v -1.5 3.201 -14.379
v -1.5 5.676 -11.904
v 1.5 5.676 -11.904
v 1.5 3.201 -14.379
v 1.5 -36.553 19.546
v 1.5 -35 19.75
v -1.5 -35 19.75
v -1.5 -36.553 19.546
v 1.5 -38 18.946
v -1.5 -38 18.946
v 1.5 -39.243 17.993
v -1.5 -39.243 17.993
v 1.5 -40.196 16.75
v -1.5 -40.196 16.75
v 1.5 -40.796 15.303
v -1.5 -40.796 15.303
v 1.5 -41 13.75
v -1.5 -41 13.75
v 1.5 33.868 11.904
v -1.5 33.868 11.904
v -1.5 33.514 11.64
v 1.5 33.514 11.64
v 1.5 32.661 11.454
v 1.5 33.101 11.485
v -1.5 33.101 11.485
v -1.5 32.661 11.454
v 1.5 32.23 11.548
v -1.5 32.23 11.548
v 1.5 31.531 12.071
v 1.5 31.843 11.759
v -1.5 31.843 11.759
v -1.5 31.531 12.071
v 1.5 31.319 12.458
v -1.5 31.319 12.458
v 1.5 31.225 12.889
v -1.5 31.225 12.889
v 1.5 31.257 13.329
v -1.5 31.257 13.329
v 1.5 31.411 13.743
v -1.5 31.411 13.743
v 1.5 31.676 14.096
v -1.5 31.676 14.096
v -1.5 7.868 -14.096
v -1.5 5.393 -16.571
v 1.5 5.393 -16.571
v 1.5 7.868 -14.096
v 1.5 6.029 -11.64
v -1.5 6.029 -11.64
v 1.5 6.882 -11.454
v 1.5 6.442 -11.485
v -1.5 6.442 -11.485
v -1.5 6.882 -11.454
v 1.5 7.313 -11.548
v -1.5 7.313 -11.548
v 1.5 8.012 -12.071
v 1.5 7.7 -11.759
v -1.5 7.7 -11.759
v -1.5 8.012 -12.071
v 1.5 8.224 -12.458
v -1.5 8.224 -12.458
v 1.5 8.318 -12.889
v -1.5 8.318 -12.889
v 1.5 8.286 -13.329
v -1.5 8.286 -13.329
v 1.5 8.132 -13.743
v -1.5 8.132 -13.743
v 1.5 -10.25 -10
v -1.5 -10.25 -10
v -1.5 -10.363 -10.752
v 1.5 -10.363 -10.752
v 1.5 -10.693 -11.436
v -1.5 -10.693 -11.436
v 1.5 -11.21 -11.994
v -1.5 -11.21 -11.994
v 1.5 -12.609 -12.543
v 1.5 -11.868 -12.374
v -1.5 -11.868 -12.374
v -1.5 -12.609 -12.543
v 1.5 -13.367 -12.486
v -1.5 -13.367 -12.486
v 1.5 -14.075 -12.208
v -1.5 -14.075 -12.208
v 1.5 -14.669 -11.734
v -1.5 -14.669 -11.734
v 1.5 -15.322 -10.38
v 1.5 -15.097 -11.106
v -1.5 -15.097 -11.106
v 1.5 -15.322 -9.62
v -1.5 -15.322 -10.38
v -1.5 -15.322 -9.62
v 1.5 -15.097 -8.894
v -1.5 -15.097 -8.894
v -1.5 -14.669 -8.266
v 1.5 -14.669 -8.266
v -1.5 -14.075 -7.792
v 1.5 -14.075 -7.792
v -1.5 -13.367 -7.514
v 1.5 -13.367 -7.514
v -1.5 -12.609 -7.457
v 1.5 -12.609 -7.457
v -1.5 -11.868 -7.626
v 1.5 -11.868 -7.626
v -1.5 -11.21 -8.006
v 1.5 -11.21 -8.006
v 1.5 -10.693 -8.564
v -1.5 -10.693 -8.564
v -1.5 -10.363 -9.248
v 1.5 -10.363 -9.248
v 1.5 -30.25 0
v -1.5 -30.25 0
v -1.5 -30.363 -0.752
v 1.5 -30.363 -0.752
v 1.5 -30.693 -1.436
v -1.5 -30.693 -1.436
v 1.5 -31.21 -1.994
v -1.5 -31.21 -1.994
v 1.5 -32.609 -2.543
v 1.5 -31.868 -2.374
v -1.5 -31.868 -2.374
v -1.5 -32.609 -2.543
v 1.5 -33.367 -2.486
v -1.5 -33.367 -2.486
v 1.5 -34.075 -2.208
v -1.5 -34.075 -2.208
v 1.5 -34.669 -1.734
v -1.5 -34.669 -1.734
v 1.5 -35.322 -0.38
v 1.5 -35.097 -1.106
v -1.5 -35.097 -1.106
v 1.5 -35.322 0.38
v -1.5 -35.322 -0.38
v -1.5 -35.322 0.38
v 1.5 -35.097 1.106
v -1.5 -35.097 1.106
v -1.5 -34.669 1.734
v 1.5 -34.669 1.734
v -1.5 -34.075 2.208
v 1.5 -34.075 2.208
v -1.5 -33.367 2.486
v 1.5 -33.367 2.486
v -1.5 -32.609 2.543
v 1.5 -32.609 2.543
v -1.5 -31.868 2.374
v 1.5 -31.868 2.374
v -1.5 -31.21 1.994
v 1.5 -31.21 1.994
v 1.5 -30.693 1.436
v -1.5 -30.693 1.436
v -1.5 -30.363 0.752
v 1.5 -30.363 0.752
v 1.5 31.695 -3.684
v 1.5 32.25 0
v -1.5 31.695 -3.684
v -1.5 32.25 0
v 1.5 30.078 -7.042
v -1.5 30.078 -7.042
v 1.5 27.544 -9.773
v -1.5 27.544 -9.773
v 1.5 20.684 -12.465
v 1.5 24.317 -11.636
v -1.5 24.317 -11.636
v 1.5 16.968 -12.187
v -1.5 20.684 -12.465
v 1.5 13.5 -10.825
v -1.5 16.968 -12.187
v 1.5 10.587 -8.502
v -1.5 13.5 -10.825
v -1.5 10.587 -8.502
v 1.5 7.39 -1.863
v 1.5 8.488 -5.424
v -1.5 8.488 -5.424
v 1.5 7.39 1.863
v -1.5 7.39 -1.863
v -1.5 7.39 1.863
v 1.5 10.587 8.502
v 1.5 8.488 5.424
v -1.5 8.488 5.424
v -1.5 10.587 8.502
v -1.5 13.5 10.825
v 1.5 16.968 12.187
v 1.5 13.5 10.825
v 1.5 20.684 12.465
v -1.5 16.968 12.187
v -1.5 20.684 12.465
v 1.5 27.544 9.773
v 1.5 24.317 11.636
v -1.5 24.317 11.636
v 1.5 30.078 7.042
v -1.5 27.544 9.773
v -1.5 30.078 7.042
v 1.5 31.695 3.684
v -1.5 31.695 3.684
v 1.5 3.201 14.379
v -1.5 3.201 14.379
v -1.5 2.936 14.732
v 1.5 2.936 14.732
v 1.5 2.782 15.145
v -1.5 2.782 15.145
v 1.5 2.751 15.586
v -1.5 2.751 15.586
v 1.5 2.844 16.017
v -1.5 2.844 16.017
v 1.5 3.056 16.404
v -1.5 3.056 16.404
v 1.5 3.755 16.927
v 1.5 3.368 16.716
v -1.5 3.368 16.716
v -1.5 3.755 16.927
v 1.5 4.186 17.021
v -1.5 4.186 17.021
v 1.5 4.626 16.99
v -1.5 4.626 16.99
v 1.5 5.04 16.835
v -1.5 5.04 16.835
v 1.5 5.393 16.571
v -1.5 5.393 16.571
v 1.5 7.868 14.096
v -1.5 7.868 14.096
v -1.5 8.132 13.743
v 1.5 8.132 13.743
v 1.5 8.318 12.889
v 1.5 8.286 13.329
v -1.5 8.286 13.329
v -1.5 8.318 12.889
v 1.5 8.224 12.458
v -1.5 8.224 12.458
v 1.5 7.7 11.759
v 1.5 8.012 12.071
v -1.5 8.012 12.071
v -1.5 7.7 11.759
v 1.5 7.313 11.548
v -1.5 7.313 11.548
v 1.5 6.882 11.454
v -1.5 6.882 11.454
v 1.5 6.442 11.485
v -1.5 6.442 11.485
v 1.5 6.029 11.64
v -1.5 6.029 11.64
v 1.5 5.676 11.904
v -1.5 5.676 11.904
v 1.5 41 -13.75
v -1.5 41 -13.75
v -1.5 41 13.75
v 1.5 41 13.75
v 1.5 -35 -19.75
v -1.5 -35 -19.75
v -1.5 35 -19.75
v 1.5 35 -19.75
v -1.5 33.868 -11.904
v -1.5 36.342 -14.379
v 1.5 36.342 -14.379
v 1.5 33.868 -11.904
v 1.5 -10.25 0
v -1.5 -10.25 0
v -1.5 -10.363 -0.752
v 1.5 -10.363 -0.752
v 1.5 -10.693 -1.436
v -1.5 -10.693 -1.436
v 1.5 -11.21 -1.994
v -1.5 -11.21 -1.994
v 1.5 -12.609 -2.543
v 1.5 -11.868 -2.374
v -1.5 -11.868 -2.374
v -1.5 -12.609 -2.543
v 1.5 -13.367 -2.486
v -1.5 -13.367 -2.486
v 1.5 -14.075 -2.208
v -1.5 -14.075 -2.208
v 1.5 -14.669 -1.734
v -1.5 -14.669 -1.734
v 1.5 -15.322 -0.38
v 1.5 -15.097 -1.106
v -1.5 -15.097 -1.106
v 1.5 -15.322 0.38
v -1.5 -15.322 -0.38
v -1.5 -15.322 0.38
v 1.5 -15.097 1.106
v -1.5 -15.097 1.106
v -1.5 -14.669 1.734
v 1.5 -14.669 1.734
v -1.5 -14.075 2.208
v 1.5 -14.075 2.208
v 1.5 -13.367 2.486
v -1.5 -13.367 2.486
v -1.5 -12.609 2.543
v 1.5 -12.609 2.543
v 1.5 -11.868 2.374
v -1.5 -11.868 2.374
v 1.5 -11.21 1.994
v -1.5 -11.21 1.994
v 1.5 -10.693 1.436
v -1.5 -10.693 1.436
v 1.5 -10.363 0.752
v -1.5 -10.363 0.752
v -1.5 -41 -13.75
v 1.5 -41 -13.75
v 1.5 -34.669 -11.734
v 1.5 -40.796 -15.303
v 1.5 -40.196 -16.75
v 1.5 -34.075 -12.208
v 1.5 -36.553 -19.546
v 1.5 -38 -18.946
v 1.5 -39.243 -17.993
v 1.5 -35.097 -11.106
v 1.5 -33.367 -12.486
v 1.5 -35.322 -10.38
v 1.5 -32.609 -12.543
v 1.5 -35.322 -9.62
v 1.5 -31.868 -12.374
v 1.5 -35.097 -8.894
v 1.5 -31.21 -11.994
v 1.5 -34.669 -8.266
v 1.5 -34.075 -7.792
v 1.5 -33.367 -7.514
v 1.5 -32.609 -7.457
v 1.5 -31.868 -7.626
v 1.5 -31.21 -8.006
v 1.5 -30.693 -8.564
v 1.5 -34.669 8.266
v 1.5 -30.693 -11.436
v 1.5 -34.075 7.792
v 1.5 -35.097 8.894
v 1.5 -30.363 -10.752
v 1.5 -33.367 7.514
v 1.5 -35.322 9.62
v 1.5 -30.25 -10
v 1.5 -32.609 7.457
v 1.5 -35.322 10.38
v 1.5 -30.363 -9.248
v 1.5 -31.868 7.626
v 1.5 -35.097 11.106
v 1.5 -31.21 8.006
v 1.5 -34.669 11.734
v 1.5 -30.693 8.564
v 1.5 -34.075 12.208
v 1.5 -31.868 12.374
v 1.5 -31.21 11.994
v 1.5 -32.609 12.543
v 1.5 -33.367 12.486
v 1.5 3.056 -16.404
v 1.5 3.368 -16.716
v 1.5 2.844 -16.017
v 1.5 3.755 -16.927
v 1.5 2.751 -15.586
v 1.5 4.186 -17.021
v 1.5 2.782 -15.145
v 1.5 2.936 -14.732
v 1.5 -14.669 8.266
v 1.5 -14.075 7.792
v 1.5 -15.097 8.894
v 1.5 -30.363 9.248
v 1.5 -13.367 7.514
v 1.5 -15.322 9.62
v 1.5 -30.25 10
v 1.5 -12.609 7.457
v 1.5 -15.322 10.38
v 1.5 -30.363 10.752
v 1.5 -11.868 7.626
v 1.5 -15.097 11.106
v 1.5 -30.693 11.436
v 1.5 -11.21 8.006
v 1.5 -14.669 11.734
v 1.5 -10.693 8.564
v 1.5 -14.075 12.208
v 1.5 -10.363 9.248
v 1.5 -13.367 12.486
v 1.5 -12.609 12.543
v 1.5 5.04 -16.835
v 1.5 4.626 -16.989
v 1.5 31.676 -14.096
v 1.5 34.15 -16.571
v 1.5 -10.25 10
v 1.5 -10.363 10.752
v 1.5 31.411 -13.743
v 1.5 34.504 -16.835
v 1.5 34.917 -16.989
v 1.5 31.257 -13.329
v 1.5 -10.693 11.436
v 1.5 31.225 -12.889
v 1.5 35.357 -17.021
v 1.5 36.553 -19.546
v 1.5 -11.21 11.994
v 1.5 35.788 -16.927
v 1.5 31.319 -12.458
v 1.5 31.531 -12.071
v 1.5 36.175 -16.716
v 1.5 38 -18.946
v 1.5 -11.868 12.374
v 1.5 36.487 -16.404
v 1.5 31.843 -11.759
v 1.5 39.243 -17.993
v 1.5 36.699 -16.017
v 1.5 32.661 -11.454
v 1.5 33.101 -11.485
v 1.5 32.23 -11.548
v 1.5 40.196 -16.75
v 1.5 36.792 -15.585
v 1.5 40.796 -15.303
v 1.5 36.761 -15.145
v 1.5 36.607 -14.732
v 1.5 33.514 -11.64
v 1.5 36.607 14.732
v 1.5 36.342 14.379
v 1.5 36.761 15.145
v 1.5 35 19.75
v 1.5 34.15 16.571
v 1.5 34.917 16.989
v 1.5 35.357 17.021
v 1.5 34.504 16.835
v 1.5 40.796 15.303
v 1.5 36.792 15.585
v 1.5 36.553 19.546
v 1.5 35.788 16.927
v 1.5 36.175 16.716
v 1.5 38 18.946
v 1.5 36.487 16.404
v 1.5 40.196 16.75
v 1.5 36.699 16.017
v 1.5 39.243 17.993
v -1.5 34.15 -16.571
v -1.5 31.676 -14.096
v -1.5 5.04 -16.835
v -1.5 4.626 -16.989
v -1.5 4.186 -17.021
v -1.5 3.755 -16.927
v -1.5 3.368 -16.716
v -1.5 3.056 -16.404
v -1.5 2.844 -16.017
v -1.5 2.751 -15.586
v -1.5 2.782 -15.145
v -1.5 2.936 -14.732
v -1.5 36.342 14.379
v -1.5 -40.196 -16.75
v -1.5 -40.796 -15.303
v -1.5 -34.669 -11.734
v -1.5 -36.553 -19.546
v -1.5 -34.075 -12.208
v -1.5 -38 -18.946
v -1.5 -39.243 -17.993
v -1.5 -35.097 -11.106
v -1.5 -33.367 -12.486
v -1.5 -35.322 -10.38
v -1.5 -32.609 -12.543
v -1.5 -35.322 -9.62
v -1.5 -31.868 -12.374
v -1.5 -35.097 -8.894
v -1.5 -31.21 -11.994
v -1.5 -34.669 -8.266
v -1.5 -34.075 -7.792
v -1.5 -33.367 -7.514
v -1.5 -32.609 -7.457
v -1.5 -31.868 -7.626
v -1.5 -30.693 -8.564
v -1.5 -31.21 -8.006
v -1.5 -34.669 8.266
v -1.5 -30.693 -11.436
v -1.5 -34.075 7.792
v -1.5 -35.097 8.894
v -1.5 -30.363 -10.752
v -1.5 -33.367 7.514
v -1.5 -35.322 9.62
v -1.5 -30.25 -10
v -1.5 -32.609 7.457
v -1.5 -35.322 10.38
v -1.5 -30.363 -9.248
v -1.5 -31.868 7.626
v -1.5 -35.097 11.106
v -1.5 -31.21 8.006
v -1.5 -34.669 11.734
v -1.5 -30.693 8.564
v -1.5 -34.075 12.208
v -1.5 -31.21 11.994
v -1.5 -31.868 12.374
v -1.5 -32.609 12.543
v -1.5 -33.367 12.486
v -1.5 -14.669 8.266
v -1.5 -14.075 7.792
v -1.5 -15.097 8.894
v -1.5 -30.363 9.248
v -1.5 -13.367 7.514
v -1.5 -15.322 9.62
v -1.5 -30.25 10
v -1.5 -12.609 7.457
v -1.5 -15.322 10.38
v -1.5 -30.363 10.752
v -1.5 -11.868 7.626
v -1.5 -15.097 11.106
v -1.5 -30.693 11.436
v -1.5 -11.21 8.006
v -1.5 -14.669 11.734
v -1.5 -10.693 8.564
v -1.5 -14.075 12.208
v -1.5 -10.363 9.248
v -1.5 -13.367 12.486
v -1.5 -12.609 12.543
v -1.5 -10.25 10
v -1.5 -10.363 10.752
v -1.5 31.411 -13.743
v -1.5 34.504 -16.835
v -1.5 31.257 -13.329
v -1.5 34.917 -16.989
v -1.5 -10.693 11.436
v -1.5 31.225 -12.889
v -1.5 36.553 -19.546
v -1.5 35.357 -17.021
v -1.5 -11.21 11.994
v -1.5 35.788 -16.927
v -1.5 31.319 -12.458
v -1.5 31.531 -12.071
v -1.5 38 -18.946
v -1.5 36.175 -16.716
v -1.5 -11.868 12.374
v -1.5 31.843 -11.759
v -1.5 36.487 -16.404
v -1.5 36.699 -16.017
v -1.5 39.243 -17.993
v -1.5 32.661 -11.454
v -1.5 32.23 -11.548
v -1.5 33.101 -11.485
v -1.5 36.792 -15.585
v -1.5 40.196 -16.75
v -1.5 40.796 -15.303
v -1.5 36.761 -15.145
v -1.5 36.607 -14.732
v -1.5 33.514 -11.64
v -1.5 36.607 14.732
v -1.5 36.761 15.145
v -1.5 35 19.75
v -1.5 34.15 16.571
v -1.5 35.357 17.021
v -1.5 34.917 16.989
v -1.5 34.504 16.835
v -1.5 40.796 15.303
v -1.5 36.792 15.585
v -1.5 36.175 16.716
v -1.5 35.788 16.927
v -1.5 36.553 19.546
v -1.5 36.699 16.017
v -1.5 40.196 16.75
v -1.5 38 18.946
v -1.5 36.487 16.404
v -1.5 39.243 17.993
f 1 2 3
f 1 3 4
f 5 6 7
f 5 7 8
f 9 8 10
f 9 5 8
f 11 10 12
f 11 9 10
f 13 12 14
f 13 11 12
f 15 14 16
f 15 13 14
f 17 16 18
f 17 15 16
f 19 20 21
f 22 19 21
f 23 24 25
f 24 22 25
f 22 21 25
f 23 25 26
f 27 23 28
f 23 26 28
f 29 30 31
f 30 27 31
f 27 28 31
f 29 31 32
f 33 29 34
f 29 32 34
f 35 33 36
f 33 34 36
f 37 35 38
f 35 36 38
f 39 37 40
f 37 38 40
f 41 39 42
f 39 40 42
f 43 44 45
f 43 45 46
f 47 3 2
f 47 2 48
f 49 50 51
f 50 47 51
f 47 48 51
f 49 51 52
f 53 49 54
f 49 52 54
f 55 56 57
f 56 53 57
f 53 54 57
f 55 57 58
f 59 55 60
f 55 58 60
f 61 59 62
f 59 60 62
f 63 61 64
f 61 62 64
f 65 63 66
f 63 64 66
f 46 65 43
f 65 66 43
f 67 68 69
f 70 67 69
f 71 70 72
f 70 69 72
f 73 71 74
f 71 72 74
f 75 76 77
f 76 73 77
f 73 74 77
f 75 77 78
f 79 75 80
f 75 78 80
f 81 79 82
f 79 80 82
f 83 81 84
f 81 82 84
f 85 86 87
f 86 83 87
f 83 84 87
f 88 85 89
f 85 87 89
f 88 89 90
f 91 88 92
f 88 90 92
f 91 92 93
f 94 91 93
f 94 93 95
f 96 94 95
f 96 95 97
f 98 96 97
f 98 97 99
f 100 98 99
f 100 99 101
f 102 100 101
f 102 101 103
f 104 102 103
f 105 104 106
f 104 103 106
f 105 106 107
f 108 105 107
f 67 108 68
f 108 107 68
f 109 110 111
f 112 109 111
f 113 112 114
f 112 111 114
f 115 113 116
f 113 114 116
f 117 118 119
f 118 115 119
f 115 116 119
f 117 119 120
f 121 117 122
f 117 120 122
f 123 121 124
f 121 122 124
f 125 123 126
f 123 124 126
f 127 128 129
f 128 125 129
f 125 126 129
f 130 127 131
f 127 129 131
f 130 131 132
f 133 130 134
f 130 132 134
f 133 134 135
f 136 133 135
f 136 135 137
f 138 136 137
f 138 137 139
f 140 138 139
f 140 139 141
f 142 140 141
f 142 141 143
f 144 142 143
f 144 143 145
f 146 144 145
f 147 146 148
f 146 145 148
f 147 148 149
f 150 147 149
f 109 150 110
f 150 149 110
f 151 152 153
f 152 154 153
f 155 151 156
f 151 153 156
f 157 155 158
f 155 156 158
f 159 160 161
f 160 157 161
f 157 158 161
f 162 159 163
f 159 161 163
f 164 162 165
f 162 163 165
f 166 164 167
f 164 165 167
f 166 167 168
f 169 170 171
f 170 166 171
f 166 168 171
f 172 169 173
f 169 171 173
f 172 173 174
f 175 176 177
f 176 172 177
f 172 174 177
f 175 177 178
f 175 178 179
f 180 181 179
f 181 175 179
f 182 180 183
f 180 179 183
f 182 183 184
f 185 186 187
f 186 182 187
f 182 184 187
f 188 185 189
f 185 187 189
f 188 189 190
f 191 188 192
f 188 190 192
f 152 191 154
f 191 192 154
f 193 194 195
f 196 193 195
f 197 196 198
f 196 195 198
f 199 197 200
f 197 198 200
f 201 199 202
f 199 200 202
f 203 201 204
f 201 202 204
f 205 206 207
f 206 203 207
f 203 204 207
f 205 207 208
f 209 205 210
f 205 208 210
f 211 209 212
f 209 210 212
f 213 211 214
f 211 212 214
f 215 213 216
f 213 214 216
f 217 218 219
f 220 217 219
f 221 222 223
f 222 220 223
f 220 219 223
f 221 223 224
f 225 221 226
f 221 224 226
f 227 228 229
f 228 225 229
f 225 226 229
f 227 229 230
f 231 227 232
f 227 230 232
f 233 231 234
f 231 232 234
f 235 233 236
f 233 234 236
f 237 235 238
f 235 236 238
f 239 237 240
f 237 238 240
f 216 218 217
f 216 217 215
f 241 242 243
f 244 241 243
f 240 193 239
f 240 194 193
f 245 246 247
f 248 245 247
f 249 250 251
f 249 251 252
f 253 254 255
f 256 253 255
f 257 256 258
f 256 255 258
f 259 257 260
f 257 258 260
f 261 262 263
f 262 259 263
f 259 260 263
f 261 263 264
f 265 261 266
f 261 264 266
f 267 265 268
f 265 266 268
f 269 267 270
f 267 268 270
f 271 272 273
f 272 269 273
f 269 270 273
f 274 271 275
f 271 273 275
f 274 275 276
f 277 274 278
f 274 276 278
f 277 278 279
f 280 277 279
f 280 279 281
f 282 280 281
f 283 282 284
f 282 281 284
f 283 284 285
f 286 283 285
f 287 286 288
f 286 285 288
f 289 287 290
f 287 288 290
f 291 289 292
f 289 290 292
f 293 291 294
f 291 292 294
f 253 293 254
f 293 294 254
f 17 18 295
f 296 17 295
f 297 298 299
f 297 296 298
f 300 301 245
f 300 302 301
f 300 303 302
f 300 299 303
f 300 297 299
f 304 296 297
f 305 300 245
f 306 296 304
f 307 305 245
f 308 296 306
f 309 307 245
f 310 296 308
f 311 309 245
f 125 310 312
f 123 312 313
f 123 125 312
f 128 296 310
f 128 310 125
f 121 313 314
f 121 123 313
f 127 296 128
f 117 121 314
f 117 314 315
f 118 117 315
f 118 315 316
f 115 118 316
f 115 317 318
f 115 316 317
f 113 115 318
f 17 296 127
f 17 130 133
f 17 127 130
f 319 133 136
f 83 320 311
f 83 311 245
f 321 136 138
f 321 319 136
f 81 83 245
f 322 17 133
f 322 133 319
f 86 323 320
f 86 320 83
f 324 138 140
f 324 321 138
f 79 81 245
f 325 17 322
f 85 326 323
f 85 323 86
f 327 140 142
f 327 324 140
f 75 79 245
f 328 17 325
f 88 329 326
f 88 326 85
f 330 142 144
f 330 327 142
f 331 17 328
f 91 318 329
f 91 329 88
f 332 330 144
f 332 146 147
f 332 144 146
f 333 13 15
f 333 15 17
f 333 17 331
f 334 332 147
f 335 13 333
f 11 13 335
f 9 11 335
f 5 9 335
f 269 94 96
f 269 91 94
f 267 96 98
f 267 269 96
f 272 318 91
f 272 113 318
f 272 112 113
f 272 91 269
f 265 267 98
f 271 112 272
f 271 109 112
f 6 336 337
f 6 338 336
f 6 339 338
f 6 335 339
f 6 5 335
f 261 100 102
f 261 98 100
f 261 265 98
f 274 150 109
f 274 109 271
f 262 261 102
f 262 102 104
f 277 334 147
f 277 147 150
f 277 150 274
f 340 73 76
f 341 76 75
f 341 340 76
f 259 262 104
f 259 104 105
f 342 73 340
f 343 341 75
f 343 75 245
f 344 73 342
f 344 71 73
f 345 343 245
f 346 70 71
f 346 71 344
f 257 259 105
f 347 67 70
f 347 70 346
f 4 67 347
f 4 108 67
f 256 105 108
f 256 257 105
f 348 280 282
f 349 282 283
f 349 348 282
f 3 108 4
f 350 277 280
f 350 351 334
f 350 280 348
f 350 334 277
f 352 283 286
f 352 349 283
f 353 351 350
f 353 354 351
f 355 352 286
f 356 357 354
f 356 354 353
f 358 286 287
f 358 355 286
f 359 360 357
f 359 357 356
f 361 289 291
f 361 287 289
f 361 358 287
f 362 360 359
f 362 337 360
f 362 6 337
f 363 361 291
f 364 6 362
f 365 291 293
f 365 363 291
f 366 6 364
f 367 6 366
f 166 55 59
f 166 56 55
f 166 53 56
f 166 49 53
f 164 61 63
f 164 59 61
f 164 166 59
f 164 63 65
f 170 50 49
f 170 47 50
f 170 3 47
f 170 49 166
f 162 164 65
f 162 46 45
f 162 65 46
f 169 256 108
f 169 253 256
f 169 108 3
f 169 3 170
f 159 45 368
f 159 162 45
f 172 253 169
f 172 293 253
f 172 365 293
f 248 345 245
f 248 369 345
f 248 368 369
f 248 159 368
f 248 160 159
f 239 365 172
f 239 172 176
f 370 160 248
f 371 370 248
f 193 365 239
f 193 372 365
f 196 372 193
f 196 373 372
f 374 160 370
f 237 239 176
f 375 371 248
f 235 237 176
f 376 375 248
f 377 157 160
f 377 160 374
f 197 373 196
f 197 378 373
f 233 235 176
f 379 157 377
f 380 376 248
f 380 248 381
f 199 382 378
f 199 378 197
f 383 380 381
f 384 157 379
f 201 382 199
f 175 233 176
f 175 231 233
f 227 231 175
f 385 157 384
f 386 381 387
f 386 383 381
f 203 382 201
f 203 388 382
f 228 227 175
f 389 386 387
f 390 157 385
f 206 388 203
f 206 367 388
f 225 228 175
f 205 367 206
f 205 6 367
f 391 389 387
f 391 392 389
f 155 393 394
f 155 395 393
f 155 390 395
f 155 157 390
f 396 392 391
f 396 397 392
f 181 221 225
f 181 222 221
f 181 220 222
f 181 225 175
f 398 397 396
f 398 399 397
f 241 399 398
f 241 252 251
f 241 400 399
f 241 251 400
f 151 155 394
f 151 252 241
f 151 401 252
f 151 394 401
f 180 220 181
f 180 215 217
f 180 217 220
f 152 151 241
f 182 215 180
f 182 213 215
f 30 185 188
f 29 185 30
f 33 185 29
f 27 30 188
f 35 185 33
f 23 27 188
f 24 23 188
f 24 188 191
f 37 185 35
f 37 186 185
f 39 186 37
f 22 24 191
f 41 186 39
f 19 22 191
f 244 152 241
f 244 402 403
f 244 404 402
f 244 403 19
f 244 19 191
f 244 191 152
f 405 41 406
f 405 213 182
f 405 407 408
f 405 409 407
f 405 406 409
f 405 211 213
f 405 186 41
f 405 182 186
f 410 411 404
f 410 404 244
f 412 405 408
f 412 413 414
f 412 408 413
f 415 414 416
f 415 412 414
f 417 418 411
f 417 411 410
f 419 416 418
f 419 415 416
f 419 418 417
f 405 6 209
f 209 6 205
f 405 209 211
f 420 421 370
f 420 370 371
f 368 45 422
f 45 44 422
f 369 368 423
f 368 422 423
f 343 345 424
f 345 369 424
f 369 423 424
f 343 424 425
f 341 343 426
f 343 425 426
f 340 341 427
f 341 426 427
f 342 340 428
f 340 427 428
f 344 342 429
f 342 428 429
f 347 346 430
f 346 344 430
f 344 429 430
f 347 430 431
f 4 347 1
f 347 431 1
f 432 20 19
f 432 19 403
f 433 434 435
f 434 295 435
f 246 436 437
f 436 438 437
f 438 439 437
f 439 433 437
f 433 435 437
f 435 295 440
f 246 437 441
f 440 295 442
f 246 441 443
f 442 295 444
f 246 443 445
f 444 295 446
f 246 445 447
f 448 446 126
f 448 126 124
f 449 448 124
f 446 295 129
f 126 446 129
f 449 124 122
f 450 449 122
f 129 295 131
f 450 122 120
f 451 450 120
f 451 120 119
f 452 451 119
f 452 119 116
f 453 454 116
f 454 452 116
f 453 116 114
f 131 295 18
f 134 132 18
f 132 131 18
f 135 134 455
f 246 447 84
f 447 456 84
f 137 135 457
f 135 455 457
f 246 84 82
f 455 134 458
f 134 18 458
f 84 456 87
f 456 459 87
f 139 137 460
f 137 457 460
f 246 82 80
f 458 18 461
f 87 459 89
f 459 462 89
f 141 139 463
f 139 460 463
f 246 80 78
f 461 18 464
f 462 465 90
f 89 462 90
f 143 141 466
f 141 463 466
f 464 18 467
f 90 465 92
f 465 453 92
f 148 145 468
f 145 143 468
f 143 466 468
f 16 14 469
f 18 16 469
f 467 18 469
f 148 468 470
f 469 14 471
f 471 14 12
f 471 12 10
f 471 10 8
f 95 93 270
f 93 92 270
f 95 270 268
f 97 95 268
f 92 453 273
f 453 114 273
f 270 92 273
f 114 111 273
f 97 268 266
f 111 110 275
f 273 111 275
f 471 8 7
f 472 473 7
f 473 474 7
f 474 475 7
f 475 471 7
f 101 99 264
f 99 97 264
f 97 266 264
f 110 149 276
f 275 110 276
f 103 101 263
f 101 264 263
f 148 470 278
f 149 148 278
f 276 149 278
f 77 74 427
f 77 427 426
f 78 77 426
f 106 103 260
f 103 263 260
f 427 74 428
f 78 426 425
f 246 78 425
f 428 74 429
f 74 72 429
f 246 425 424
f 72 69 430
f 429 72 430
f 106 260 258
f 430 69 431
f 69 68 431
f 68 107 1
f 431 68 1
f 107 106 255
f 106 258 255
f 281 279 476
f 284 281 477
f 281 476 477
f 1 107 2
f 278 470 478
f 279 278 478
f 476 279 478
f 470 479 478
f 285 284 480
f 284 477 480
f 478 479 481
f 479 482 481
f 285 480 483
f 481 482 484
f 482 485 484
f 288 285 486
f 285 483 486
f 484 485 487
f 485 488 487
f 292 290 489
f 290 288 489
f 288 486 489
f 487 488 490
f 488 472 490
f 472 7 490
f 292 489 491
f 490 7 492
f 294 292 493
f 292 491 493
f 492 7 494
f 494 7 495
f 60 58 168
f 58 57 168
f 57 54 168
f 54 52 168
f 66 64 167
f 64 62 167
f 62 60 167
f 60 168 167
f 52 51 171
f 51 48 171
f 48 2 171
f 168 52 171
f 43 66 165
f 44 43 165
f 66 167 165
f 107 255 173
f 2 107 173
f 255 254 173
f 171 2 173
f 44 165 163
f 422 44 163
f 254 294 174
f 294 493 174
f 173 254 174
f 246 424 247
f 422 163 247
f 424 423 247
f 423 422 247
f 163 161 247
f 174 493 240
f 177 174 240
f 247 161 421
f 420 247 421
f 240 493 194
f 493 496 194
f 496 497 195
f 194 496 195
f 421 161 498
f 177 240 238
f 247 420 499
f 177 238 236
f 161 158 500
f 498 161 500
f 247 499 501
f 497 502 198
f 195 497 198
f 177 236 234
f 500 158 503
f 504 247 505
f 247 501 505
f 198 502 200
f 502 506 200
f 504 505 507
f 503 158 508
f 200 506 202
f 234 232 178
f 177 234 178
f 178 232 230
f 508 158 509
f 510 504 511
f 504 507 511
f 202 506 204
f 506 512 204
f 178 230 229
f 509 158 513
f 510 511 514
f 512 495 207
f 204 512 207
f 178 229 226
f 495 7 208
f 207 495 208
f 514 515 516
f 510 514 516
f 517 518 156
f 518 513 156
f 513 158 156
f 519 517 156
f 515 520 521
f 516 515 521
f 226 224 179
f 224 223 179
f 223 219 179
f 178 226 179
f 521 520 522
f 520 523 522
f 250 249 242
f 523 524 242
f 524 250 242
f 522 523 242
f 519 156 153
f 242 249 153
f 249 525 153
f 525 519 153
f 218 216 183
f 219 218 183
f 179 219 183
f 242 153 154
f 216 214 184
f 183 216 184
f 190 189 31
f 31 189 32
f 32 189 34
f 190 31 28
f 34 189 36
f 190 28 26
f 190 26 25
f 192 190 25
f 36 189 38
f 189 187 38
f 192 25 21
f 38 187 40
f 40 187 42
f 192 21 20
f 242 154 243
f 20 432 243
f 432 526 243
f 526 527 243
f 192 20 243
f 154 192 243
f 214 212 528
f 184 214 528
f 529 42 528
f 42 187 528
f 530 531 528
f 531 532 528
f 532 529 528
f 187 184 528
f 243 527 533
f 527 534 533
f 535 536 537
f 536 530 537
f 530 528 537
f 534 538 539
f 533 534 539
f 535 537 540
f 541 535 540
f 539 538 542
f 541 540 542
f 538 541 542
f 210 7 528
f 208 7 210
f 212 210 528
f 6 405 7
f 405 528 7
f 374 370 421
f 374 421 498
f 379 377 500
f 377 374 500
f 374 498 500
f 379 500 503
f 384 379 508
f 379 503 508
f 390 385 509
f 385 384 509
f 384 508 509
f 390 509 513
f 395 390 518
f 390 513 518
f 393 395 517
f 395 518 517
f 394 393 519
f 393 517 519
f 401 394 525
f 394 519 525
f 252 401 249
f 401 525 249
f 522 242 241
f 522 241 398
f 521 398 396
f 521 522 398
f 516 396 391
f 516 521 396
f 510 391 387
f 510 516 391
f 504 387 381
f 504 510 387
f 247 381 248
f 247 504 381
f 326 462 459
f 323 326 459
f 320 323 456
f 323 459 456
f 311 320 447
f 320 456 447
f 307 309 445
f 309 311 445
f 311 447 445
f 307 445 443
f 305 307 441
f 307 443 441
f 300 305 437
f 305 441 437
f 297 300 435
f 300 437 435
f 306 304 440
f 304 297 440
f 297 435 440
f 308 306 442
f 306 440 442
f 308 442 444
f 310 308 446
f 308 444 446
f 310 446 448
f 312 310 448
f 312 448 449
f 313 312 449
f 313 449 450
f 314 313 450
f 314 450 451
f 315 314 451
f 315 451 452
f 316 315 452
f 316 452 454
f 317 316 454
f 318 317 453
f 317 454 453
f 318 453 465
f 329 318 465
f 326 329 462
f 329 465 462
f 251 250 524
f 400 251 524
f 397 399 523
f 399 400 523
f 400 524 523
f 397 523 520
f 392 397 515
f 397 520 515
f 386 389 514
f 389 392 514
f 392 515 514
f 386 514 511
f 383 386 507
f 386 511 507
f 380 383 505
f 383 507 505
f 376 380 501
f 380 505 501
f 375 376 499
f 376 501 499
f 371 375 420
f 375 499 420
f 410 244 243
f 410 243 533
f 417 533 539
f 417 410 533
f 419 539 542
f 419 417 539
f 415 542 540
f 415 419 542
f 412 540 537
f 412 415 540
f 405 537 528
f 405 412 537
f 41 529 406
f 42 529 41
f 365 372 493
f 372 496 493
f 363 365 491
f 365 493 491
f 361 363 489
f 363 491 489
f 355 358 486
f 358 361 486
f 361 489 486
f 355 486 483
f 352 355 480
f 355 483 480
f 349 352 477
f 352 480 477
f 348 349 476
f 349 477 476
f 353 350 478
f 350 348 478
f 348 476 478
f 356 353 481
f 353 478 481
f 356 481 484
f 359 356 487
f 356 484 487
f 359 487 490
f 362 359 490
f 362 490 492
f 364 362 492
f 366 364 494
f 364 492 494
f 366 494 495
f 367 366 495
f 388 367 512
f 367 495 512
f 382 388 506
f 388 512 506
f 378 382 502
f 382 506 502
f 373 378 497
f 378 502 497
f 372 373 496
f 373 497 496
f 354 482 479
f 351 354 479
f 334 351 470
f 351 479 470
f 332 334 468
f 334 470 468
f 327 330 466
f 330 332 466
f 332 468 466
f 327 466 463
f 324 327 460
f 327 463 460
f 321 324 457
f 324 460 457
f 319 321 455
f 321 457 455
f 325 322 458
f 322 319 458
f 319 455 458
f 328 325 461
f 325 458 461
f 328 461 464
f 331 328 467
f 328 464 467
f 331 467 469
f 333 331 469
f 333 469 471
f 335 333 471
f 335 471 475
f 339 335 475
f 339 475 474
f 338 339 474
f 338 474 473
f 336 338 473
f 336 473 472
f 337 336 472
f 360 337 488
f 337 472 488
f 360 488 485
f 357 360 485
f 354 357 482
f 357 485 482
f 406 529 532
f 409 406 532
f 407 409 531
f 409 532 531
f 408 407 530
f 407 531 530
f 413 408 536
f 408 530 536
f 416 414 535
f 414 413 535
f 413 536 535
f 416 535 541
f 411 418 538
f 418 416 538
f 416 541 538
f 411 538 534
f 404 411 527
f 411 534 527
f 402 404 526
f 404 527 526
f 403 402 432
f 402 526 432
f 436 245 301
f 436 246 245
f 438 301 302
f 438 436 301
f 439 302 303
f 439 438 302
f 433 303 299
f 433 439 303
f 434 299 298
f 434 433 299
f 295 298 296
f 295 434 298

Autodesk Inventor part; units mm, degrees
ref_plane "YZ Plane" through (0, 0, 0) normal (1, 0, 0) x (0, 1, 0)
ref_plane "XZ Plane" through (0, 0, 0) normal (0, 1, 0) x (-1, 0, 0)
ref_plane "XY Plane" through (0, 0, 0) normal (0, 0, 1) x (1, 0, 0)
sketch "Sketch1" plane through (0, 0, 0) normal (1, 0, 0) x (0, 1, 0)
  line L0 (41, 19.75) -> (-41, 19.75)
  line L1 (-41, 19.75) -> (-41, -19.75)
  line L2 (-41, -19.75) -> (41, -19.75)
  line L3 (41, -19.75) -> (41, 19.75)
  line L4 (41, 19.75) -> (-41, -19.75) construction
  line L5 (-41, 19.75) -> (41, -19.75) construction
  circle A0 centre (19.75, 0) radius 12.5
  line L6 (35.2464, 15.4749) -> (32.7715, 13) construction
  line L7 (34.1504, 16.5709) -> (31.6755, 14.096)
  line L8 (33.8675, 11.904) -> (36.3424, 14.3789)
  arc A1 (36.3424, 14.3789) -> (34.1504, 16.5709) centre (35.2464, 15.4749) ccw
  arc A2 (31.6755, 14.096) -> (33.8675, 11.904) centre (32.7715, 13) ccw
  line L9 (35.2464, -15.4749) -> (32.7715, -13) construction
  line L10 (36.3424, -14.3789) -> (33.8675, -11.904)
  line L11 (31.6755, -14.096) -> (34.1504, -16.5709)
  arc A3 (34.1504, -16.5709) -> (36.3424, -14.3789) centre (35.2464, -15.4749) ccw
  arc A4 (33.8675, -11.904) -> (31.6755, -14.096) centre (32.7715, -13) ccw
  line L12 (6.7715, -13) -> (4.2966, -15.4749) construction
  line L13 (5.6755, -11.904) -> (3.2006, -14.3789)
  line L14 (5.3927, -16.5709) -> (7.8675, -14.096)
  arc A5 (7.8675, -14.096) -> (5.6755, -11.904) centre (6.7715, -13) ccw
  arc A6 (3.2006, -14.3789) -> (5.3927, -16.5709) centre (4.2966, -15.4749) ccw
  line L15 (6.7715, 13) -> (4.2966, 15.4749) construction
  line L16 (7.8675, 14.096) -> (5.3927, 16.5709)
  line L17 (3.2006, 14.3789) -> (5.6755, 11.904)
  arc A7 (5.6755, 11.904) -> (7.8675, 14.096) centre (6.7715, 13) ccw
  arc A8 (5.3927, 16.5709) -> (3.2006, 14.3789) centre (4.2966, 15.4749) ccw
  line L18 (-57.4, 0) -> (57.4, 0) construction
  line L19 (0, -27.65) -> (0, 27.65) construction
  circle A9 centre (-32.8, 10) radius 2.55
  circle A10 centre (-32.8, 0) radius 2.55
  circle A11 centre (-32.8, -10) radius 2.55
  circle A12 centre (-12.8, 10) radius 2.55
  circle A13 centre (-12.8, -10) radius 2.55
  circle A14 centre (-12.8, 0) radius 2.55
  point P0 (0, 0)
  point P1 (34.009, 14.2374)
  point P2 (34.009, -14.2374)
  point P3 (5.5341, -14.2374)
  point P4 (5.5341, 14.2374)
  dimension "d0" = 82
  dimension "d1" = 39.5
  dimension "d2" = 25
  dimension "d3" = 21.25
  dimension "d4" = 45
  dimension "d5" = 45
  dimension "d6" = 45
  dimension "d7" = 3.5
  dimension "d8" = 3.5
  dimension "d9" = 3.5
  dimension "d10" = 3.5
  dimension "d11" = 3.1
  dimension "d12" = 3.1
  dimension "d13" = 3.1
  dimension "d14" = 3.1
  dimension "d16" = 18.4
  dimension "d17" = 26
  dimension "d19" = 26
  dimension "d20" = 13
  dimension "d21" = 5.1
  dimension "d22" = 5.1
  dimension "d23" = 5.1
  dimension "d24" = 5.1
  dimension "d25" = 5.1
  dimension "d26" = 5.1
  dimension "d27" = 8.2
  dimension "d28" = 9.75
  dimension "d29" = 9.75
  dimension "d30" = 20
extrude "Plate1" add sketch "Sketch1" along normal mid plane 3
fillet "Corner Round1" radius 6 4 edges at (0, 41, 19.75) (0, 41, -19.75) (0, -41, 19.75) (0, -41, -19.75)
equation "\"d8\" = d7"
equation "\"d22\" = d21"
equation "\"d23\" = d22"
equation "\"d24\" = d23"
equation "\"d25\" = d24"
equation "\"d26\" = d24"
equation "\"d31\" = Thickness"
equation "\"BendRadius\" = Thickness"
equation "\"BendReliefWidth\" = Thickness"
equation "\"BendReliefDepth\" = 0.5 * Thickness"
equation "\"CornerReliefSize\" = 4 * Thickness"
equation "\"MinimumRemnant\" = 2 * Thickness"
equation "\"TransitionRadius\" = BendRadius"
equation "\"JacobiRadiusSize\" = BendRadius"
equation "\"GapSize\" = Thickness"
equation "\"Thickness\" = 3"
properties part number "HCMUTE-CDT23-OP_GA-STEP-42"
